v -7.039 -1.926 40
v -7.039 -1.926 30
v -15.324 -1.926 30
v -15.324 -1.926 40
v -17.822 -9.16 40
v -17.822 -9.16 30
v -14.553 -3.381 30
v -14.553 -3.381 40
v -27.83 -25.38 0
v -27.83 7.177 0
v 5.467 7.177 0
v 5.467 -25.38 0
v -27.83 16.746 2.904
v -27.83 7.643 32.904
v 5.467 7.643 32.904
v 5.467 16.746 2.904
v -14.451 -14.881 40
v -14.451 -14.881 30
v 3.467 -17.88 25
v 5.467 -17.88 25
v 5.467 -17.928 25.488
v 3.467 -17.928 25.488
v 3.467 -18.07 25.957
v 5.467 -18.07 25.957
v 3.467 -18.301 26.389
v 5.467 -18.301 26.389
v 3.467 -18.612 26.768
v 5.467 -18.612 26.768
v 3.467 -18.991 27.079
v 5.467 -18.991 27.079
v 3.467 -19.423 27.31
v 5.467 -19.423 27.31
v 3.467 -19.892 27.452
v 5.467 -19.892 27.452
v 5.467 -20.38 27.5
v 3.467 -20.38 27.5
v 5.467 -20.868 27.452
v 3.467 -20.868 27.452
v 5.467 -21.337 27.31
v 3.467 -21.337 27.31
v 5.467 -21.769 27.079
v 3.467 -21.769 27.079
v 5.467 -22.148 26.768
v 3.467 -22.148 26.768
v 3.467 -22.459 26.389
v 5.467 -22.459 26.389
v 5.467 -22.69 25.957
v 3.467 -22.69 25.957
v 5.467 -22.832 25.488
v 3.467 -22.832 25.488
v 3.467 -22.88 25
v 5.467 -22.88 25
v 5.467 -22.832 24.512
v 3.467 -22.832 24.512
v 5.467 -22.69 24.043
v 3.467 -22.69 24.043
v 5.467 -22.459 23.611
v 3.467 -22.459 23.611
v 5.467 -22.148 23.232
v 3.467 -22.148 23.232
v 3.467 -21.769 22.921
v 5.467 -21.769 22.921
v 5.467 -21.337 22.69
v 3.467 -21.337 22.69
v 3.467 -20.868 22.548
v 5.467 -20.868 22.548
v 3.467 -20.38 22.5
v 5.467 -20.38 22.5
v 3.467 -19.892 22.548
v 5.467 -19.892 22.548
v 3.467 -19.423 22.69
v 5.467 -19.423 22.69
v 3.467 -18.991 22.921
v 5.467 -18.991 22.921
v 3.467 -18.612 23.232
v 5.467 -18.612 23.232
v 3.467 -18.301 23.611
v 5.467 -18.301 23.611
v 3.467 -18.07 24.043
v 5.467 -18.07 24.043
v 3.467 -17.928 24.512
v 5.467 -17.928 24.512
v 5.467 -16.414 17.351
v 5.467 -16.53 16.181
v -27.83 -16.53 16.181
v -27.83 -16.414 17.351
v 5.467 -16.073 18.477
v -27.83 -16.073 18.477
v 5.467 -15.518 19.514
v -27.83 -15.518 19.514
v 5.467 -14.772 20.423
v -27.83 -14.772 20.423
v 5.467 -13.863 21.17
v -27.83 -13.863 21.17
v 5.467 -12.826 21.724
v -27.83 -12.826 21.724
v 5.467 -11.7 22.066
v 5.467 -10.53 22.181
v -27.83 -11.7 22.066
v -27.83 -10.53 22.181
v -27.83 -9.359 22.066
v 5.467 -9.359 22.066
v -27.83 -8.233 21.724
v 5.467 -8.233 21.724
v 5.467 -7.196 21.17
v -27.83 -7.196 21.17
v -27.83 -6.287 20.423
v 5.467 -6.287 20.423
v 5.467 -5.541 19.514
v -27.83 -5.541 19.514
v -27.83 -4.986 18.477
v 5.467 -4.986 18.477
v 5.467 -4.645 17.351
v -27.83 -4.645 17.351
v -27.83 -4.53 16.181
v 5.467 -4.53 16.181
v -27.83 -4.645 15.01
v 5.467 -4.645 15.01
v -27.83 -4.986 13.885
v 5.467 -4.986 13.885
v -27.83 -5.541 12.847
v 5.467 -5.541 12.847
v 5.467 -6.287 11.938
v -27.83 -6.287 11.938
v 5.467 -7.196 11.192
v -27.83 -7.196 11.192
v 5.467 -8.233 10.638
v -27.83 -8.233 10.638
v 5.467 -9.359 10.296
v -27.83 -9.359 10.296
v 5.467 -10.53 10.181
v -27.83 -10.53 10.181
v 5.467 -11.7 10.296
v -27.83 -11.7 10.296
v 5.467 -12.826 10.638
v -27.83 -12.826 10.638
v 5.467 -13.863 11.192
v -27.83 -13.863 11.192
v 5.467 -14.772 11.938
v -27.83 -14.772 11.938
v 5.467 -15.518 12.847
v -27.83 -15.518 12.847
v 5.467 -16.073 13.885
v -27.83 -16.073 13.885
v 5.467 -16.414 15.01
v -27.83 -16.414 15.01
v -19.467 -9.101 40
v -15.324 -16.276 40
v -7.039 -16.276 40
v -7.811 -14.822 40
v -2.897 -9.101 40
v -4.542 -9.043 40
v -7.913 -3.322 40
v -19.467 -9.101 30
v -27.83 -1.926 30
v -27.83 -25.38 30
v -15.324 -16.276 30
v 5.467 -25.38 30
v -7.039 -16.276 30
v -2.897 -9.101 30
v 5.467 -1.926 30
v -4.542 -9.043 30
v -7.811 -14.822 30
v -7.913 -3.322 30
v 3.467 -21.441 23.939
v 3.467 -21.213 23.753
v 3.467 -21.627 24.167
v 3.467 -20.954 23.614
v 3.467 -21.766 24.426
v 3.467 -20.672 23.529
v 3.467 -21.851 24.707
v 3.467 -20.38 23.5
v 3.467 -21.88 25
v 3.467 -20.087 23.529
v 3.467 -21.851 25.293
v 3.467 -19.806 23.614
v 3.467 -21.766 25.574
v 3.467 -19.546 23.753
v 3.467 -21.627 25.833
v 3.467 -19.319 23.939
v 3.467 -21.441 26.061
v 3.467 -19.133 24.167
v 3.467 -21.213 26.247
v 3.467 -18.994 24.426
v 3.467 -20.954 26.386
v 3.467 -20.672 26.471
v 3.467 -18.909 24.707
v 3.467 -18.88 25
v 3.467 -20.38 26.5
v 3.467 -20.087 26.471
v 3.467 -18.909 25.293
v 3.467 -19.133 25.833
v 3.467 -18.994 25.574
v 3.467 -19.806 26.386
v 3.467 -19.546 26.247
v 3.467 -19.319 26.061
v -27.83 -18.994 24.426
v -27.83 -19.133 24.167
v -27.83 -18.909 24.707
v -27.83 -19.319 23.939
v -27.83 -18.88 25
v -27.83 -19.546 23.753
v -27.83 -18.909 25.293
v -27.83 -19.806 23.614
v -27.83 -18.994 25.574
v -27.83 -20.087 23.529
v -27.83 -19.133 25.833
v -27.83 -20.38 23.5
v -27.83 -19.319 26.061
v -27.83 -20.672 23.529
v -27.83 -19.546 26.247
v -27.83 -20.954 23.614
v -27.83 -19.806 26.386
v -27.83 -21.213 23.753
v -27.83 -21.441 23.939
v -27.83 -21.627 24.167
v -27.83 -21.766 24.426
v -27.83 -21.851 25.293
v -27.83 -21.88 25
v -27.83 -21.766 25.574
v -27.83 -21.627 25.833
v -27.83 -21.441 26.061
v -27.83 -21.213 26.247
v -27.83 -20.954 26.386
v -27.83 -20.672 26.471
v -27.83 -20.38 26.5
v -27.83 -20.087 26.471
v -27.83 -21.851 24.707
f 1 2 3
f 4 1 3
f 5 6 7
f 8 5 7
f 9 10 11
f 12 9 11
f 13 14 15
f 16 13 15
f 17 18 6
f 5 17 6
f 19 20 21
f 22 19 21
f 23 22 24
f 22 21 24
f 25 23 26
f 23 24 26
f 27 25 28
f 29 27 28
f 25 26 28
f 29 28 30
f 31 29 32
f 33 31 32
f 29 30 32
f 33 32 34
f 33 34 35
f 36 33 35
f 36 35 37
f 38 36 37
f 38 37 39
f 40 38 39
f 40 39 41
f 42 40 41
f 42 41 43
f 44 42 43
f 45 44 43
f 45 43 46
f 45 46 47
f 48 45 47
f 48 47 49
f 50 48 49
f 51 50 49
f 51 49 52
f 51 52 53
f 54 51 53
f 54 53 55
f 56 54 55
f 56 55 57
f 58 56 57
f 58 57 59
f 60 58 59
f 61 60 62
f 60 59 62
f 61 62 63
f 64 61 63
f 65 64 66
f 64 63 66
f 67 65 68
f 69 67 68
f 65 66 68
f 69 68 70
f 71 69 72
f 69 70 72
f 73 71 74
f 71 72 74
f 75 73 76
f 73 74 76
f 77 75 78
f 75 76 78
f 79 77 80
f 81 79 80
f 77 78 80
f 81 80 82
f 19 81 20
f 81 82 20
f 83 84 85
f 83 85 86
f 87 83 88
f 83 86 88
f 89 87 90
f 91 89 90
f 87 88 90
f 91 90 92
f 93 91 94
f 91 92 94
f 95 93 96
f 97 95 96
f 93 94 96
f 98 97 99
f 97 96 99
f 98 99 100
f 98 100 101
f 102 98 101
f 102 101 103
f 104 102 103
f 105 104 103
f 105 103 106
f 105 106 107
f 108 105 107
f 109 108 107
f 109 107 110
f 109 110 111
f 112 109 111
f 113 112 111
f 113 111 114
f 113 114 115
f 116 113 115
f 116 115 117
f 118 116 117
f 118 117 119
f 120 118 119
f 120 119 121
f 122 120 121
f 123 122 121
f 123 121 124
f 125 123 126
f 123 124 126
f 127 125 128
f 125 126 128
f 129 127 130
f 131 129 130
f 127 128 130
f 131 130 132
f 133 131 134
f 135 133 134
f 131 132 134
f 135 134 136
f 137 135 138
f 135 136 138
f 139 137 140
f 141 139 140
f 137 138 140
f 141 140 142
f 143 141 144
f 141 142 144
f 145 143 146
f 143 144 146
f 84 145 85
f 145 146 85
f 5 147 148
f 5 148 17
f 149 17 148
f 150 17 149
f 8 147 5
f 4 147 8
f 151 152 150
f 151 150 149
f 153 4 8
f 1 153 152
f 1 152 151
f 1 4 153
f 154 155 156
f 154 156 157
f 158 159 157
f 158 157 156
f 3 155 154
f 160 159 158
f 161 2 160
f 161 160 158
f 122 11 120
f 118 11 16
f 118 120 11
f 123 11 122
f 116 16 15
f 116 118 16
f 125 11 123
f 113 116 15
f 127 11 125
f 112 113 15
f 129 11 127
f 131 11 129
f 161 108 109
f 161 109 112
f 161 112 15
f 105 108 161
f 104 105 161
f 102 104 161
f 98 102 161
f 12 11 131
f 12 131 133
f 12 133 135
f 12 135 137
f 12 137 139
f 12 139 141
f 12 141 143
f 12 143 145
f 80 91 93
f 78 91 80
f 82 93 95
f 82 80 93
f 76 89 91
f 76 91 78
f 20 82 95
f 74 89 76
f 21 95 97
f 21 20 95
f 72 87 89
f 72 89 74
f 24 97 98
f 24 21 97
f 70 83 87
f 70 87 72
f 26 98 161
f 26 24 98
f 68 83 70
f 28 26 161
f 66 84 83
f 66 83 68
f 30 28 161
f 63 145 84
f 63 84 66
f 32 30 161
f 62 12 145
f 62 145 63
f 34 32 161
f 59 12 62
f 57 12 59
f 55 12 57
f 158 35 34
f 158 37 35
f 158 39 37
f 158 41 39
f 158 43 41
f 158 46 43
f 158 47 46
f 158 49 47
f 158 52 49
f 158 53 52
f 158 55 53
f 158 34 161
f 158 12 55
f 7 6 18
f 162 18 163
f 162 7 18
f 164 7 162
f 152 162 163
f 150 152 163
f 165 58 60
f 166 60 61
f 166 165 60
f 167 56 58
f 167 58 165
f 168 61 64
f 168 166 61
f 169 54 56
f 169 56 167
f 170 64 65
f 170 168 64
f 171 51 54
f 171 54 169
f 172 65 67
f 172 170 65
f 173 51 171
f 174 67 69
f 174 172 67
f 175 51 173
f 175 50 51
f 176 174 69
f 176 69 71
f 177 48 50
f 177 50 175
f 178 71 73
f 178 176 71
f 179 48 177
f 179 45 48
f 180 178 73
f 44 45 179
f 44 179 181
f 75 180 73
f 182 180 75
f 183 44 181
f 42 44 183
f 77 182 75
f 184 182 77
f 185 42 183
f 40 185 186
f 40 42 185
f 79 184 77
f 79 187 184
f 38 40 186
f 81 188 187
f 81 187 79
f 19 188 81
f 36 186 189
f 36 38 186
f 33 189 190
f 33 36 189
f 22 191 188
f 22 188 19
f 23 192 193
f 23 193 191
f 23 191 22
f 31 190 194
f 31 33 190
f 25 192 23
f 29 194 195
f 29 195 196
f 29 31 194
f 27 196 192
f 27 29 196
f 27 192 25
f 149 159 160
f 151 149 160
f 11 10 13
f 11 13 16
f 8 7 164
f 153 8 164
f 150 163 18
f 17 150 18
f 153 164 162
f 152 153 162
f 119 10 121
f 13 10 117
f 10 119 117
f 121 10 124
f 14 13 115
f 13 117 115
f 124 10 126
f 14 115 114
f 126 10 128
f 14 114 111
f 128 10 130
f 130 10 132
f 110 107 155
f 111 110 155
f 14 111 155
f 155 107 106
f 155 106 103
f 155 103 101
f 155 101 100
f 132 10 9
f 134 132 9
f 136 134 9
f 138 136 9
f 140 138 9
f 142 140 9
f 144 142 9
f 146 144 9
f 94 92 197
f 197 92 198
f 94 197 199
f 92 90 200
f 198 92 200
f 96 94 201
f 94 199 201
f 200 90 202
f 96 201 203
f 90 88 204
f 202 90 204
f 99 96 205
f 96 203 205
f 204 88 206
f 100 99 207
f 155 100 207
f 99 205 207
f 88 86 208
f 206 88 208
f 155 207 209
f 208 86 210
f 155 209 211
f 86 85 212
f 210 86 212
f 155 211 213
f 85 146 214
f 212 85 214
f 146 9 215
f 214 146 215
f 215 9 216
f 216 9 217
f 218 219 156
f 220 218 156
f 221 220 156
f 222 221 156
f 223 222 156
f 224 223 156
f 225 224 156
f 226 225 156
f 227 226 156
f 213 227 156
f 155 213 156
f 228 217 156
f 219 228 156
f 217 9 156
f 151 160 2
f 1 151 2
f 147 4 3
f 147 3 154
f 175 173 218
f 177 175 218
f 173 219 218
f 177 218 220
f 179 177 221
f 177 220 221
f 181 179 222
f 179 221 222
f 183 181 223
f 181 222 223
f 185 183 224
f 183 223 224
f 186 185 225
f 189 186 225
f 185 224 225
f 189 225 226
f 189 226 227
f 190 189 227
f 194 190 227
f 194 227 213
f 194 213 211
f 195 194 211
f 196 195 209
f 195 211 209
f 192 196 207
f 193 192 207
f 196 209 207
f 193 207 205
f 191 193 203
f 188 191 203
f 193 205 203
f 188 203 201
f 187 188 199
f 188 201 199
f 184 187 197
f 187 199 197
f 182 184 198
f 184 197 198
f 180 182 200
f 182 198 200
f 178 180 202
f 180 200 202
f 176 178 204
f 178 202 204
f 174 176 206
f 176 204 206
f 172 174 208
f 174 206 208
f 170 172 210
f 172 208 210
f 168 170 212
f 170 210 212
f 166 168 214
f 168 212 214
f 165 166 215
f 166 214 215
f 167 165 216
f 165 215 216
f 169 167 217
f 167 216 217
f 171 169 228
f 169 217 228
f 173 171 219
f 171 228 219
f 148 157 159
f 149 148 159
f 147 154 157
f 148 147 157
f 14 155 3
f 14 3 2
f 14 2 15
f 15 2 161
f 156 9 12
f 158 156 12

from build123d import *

# Parameters (mm, degrees)
F0_W           = 33.2969208248
F0_H           = 32.5569906272
F1_DEPTH       = 30
F3_DEPTH       = 10
F5_D           = 12
F6_D           = 3
F6_CBORE_D     = 5
F6_CBORE_DEPTH = 2
F8_W           = 33.2969208248
F8_H           = 31.3508008987
F9_DEPTH       = 10


with BuildPart() as f1:
    # F0 (on Top) → F1 (new body)
    with BuildSketch(Plane.XY):
        with Locations((-11.1816951539, -9.1013486963)):
            Rectangle(F0_W, F0_H)
    extrude(amount=F1_DEPTH)

    # F2 (on face) → F3 (join)
    with BuildSketch(Plane.XY.offset(30)):
        Polygon((-15.3242121898, -16.2763986737), (-7.039178118, -16.2763986737), (-2.8966610822, -9.1013486963), (-7.039178118, -1.9262987189), (-15.3242121898, -1.9262987189), (-19.4667292257, -9.1013486963), align=None)
        Polygon((-14.4506519977, -14.8810296934), (-17.8215241451, -9.1601895243), (-14.5525673013, -3.3805085272), (-7.9127383102, -3.3216676992), (-4.5418661628, -9.0425078683), (-7.8108230065, -14.8221888654), align=None, mode=Mode.SUBTRACT)
    extrude(amount=F3_DEPTH)

    # F5 (through all)
    with Locations(Plane.YZ.offset(5.4667652585)):
        with Locations((-10.5295337308, 16.1808457948)):
            Hole(F5_D / 2)

    # F6 (through all)
    with Locations(Plane.YZ.offset(5.4667652585)):
        with Locations((-20.3798440099, 25)):
            CounterBoreHole(F6_D / 2, F6_CBORE_D / 2, F6_CBORE_DEPTH)

    # F8 (on 3pt) → F9 (join)
    with BuildSketch(Plane(origin=(0, 6.5719923281, 1.994259097), x_dir=(1, 0, 0), z_dir=(0, -0.9569133528, -0.2903736133))):
        with Locations((-11.1816951539, 13.591346453)):
            Rectangle(F8_W, F8_H)
    extrude(amount=-F9_DEPTH)


solid = f1.part
